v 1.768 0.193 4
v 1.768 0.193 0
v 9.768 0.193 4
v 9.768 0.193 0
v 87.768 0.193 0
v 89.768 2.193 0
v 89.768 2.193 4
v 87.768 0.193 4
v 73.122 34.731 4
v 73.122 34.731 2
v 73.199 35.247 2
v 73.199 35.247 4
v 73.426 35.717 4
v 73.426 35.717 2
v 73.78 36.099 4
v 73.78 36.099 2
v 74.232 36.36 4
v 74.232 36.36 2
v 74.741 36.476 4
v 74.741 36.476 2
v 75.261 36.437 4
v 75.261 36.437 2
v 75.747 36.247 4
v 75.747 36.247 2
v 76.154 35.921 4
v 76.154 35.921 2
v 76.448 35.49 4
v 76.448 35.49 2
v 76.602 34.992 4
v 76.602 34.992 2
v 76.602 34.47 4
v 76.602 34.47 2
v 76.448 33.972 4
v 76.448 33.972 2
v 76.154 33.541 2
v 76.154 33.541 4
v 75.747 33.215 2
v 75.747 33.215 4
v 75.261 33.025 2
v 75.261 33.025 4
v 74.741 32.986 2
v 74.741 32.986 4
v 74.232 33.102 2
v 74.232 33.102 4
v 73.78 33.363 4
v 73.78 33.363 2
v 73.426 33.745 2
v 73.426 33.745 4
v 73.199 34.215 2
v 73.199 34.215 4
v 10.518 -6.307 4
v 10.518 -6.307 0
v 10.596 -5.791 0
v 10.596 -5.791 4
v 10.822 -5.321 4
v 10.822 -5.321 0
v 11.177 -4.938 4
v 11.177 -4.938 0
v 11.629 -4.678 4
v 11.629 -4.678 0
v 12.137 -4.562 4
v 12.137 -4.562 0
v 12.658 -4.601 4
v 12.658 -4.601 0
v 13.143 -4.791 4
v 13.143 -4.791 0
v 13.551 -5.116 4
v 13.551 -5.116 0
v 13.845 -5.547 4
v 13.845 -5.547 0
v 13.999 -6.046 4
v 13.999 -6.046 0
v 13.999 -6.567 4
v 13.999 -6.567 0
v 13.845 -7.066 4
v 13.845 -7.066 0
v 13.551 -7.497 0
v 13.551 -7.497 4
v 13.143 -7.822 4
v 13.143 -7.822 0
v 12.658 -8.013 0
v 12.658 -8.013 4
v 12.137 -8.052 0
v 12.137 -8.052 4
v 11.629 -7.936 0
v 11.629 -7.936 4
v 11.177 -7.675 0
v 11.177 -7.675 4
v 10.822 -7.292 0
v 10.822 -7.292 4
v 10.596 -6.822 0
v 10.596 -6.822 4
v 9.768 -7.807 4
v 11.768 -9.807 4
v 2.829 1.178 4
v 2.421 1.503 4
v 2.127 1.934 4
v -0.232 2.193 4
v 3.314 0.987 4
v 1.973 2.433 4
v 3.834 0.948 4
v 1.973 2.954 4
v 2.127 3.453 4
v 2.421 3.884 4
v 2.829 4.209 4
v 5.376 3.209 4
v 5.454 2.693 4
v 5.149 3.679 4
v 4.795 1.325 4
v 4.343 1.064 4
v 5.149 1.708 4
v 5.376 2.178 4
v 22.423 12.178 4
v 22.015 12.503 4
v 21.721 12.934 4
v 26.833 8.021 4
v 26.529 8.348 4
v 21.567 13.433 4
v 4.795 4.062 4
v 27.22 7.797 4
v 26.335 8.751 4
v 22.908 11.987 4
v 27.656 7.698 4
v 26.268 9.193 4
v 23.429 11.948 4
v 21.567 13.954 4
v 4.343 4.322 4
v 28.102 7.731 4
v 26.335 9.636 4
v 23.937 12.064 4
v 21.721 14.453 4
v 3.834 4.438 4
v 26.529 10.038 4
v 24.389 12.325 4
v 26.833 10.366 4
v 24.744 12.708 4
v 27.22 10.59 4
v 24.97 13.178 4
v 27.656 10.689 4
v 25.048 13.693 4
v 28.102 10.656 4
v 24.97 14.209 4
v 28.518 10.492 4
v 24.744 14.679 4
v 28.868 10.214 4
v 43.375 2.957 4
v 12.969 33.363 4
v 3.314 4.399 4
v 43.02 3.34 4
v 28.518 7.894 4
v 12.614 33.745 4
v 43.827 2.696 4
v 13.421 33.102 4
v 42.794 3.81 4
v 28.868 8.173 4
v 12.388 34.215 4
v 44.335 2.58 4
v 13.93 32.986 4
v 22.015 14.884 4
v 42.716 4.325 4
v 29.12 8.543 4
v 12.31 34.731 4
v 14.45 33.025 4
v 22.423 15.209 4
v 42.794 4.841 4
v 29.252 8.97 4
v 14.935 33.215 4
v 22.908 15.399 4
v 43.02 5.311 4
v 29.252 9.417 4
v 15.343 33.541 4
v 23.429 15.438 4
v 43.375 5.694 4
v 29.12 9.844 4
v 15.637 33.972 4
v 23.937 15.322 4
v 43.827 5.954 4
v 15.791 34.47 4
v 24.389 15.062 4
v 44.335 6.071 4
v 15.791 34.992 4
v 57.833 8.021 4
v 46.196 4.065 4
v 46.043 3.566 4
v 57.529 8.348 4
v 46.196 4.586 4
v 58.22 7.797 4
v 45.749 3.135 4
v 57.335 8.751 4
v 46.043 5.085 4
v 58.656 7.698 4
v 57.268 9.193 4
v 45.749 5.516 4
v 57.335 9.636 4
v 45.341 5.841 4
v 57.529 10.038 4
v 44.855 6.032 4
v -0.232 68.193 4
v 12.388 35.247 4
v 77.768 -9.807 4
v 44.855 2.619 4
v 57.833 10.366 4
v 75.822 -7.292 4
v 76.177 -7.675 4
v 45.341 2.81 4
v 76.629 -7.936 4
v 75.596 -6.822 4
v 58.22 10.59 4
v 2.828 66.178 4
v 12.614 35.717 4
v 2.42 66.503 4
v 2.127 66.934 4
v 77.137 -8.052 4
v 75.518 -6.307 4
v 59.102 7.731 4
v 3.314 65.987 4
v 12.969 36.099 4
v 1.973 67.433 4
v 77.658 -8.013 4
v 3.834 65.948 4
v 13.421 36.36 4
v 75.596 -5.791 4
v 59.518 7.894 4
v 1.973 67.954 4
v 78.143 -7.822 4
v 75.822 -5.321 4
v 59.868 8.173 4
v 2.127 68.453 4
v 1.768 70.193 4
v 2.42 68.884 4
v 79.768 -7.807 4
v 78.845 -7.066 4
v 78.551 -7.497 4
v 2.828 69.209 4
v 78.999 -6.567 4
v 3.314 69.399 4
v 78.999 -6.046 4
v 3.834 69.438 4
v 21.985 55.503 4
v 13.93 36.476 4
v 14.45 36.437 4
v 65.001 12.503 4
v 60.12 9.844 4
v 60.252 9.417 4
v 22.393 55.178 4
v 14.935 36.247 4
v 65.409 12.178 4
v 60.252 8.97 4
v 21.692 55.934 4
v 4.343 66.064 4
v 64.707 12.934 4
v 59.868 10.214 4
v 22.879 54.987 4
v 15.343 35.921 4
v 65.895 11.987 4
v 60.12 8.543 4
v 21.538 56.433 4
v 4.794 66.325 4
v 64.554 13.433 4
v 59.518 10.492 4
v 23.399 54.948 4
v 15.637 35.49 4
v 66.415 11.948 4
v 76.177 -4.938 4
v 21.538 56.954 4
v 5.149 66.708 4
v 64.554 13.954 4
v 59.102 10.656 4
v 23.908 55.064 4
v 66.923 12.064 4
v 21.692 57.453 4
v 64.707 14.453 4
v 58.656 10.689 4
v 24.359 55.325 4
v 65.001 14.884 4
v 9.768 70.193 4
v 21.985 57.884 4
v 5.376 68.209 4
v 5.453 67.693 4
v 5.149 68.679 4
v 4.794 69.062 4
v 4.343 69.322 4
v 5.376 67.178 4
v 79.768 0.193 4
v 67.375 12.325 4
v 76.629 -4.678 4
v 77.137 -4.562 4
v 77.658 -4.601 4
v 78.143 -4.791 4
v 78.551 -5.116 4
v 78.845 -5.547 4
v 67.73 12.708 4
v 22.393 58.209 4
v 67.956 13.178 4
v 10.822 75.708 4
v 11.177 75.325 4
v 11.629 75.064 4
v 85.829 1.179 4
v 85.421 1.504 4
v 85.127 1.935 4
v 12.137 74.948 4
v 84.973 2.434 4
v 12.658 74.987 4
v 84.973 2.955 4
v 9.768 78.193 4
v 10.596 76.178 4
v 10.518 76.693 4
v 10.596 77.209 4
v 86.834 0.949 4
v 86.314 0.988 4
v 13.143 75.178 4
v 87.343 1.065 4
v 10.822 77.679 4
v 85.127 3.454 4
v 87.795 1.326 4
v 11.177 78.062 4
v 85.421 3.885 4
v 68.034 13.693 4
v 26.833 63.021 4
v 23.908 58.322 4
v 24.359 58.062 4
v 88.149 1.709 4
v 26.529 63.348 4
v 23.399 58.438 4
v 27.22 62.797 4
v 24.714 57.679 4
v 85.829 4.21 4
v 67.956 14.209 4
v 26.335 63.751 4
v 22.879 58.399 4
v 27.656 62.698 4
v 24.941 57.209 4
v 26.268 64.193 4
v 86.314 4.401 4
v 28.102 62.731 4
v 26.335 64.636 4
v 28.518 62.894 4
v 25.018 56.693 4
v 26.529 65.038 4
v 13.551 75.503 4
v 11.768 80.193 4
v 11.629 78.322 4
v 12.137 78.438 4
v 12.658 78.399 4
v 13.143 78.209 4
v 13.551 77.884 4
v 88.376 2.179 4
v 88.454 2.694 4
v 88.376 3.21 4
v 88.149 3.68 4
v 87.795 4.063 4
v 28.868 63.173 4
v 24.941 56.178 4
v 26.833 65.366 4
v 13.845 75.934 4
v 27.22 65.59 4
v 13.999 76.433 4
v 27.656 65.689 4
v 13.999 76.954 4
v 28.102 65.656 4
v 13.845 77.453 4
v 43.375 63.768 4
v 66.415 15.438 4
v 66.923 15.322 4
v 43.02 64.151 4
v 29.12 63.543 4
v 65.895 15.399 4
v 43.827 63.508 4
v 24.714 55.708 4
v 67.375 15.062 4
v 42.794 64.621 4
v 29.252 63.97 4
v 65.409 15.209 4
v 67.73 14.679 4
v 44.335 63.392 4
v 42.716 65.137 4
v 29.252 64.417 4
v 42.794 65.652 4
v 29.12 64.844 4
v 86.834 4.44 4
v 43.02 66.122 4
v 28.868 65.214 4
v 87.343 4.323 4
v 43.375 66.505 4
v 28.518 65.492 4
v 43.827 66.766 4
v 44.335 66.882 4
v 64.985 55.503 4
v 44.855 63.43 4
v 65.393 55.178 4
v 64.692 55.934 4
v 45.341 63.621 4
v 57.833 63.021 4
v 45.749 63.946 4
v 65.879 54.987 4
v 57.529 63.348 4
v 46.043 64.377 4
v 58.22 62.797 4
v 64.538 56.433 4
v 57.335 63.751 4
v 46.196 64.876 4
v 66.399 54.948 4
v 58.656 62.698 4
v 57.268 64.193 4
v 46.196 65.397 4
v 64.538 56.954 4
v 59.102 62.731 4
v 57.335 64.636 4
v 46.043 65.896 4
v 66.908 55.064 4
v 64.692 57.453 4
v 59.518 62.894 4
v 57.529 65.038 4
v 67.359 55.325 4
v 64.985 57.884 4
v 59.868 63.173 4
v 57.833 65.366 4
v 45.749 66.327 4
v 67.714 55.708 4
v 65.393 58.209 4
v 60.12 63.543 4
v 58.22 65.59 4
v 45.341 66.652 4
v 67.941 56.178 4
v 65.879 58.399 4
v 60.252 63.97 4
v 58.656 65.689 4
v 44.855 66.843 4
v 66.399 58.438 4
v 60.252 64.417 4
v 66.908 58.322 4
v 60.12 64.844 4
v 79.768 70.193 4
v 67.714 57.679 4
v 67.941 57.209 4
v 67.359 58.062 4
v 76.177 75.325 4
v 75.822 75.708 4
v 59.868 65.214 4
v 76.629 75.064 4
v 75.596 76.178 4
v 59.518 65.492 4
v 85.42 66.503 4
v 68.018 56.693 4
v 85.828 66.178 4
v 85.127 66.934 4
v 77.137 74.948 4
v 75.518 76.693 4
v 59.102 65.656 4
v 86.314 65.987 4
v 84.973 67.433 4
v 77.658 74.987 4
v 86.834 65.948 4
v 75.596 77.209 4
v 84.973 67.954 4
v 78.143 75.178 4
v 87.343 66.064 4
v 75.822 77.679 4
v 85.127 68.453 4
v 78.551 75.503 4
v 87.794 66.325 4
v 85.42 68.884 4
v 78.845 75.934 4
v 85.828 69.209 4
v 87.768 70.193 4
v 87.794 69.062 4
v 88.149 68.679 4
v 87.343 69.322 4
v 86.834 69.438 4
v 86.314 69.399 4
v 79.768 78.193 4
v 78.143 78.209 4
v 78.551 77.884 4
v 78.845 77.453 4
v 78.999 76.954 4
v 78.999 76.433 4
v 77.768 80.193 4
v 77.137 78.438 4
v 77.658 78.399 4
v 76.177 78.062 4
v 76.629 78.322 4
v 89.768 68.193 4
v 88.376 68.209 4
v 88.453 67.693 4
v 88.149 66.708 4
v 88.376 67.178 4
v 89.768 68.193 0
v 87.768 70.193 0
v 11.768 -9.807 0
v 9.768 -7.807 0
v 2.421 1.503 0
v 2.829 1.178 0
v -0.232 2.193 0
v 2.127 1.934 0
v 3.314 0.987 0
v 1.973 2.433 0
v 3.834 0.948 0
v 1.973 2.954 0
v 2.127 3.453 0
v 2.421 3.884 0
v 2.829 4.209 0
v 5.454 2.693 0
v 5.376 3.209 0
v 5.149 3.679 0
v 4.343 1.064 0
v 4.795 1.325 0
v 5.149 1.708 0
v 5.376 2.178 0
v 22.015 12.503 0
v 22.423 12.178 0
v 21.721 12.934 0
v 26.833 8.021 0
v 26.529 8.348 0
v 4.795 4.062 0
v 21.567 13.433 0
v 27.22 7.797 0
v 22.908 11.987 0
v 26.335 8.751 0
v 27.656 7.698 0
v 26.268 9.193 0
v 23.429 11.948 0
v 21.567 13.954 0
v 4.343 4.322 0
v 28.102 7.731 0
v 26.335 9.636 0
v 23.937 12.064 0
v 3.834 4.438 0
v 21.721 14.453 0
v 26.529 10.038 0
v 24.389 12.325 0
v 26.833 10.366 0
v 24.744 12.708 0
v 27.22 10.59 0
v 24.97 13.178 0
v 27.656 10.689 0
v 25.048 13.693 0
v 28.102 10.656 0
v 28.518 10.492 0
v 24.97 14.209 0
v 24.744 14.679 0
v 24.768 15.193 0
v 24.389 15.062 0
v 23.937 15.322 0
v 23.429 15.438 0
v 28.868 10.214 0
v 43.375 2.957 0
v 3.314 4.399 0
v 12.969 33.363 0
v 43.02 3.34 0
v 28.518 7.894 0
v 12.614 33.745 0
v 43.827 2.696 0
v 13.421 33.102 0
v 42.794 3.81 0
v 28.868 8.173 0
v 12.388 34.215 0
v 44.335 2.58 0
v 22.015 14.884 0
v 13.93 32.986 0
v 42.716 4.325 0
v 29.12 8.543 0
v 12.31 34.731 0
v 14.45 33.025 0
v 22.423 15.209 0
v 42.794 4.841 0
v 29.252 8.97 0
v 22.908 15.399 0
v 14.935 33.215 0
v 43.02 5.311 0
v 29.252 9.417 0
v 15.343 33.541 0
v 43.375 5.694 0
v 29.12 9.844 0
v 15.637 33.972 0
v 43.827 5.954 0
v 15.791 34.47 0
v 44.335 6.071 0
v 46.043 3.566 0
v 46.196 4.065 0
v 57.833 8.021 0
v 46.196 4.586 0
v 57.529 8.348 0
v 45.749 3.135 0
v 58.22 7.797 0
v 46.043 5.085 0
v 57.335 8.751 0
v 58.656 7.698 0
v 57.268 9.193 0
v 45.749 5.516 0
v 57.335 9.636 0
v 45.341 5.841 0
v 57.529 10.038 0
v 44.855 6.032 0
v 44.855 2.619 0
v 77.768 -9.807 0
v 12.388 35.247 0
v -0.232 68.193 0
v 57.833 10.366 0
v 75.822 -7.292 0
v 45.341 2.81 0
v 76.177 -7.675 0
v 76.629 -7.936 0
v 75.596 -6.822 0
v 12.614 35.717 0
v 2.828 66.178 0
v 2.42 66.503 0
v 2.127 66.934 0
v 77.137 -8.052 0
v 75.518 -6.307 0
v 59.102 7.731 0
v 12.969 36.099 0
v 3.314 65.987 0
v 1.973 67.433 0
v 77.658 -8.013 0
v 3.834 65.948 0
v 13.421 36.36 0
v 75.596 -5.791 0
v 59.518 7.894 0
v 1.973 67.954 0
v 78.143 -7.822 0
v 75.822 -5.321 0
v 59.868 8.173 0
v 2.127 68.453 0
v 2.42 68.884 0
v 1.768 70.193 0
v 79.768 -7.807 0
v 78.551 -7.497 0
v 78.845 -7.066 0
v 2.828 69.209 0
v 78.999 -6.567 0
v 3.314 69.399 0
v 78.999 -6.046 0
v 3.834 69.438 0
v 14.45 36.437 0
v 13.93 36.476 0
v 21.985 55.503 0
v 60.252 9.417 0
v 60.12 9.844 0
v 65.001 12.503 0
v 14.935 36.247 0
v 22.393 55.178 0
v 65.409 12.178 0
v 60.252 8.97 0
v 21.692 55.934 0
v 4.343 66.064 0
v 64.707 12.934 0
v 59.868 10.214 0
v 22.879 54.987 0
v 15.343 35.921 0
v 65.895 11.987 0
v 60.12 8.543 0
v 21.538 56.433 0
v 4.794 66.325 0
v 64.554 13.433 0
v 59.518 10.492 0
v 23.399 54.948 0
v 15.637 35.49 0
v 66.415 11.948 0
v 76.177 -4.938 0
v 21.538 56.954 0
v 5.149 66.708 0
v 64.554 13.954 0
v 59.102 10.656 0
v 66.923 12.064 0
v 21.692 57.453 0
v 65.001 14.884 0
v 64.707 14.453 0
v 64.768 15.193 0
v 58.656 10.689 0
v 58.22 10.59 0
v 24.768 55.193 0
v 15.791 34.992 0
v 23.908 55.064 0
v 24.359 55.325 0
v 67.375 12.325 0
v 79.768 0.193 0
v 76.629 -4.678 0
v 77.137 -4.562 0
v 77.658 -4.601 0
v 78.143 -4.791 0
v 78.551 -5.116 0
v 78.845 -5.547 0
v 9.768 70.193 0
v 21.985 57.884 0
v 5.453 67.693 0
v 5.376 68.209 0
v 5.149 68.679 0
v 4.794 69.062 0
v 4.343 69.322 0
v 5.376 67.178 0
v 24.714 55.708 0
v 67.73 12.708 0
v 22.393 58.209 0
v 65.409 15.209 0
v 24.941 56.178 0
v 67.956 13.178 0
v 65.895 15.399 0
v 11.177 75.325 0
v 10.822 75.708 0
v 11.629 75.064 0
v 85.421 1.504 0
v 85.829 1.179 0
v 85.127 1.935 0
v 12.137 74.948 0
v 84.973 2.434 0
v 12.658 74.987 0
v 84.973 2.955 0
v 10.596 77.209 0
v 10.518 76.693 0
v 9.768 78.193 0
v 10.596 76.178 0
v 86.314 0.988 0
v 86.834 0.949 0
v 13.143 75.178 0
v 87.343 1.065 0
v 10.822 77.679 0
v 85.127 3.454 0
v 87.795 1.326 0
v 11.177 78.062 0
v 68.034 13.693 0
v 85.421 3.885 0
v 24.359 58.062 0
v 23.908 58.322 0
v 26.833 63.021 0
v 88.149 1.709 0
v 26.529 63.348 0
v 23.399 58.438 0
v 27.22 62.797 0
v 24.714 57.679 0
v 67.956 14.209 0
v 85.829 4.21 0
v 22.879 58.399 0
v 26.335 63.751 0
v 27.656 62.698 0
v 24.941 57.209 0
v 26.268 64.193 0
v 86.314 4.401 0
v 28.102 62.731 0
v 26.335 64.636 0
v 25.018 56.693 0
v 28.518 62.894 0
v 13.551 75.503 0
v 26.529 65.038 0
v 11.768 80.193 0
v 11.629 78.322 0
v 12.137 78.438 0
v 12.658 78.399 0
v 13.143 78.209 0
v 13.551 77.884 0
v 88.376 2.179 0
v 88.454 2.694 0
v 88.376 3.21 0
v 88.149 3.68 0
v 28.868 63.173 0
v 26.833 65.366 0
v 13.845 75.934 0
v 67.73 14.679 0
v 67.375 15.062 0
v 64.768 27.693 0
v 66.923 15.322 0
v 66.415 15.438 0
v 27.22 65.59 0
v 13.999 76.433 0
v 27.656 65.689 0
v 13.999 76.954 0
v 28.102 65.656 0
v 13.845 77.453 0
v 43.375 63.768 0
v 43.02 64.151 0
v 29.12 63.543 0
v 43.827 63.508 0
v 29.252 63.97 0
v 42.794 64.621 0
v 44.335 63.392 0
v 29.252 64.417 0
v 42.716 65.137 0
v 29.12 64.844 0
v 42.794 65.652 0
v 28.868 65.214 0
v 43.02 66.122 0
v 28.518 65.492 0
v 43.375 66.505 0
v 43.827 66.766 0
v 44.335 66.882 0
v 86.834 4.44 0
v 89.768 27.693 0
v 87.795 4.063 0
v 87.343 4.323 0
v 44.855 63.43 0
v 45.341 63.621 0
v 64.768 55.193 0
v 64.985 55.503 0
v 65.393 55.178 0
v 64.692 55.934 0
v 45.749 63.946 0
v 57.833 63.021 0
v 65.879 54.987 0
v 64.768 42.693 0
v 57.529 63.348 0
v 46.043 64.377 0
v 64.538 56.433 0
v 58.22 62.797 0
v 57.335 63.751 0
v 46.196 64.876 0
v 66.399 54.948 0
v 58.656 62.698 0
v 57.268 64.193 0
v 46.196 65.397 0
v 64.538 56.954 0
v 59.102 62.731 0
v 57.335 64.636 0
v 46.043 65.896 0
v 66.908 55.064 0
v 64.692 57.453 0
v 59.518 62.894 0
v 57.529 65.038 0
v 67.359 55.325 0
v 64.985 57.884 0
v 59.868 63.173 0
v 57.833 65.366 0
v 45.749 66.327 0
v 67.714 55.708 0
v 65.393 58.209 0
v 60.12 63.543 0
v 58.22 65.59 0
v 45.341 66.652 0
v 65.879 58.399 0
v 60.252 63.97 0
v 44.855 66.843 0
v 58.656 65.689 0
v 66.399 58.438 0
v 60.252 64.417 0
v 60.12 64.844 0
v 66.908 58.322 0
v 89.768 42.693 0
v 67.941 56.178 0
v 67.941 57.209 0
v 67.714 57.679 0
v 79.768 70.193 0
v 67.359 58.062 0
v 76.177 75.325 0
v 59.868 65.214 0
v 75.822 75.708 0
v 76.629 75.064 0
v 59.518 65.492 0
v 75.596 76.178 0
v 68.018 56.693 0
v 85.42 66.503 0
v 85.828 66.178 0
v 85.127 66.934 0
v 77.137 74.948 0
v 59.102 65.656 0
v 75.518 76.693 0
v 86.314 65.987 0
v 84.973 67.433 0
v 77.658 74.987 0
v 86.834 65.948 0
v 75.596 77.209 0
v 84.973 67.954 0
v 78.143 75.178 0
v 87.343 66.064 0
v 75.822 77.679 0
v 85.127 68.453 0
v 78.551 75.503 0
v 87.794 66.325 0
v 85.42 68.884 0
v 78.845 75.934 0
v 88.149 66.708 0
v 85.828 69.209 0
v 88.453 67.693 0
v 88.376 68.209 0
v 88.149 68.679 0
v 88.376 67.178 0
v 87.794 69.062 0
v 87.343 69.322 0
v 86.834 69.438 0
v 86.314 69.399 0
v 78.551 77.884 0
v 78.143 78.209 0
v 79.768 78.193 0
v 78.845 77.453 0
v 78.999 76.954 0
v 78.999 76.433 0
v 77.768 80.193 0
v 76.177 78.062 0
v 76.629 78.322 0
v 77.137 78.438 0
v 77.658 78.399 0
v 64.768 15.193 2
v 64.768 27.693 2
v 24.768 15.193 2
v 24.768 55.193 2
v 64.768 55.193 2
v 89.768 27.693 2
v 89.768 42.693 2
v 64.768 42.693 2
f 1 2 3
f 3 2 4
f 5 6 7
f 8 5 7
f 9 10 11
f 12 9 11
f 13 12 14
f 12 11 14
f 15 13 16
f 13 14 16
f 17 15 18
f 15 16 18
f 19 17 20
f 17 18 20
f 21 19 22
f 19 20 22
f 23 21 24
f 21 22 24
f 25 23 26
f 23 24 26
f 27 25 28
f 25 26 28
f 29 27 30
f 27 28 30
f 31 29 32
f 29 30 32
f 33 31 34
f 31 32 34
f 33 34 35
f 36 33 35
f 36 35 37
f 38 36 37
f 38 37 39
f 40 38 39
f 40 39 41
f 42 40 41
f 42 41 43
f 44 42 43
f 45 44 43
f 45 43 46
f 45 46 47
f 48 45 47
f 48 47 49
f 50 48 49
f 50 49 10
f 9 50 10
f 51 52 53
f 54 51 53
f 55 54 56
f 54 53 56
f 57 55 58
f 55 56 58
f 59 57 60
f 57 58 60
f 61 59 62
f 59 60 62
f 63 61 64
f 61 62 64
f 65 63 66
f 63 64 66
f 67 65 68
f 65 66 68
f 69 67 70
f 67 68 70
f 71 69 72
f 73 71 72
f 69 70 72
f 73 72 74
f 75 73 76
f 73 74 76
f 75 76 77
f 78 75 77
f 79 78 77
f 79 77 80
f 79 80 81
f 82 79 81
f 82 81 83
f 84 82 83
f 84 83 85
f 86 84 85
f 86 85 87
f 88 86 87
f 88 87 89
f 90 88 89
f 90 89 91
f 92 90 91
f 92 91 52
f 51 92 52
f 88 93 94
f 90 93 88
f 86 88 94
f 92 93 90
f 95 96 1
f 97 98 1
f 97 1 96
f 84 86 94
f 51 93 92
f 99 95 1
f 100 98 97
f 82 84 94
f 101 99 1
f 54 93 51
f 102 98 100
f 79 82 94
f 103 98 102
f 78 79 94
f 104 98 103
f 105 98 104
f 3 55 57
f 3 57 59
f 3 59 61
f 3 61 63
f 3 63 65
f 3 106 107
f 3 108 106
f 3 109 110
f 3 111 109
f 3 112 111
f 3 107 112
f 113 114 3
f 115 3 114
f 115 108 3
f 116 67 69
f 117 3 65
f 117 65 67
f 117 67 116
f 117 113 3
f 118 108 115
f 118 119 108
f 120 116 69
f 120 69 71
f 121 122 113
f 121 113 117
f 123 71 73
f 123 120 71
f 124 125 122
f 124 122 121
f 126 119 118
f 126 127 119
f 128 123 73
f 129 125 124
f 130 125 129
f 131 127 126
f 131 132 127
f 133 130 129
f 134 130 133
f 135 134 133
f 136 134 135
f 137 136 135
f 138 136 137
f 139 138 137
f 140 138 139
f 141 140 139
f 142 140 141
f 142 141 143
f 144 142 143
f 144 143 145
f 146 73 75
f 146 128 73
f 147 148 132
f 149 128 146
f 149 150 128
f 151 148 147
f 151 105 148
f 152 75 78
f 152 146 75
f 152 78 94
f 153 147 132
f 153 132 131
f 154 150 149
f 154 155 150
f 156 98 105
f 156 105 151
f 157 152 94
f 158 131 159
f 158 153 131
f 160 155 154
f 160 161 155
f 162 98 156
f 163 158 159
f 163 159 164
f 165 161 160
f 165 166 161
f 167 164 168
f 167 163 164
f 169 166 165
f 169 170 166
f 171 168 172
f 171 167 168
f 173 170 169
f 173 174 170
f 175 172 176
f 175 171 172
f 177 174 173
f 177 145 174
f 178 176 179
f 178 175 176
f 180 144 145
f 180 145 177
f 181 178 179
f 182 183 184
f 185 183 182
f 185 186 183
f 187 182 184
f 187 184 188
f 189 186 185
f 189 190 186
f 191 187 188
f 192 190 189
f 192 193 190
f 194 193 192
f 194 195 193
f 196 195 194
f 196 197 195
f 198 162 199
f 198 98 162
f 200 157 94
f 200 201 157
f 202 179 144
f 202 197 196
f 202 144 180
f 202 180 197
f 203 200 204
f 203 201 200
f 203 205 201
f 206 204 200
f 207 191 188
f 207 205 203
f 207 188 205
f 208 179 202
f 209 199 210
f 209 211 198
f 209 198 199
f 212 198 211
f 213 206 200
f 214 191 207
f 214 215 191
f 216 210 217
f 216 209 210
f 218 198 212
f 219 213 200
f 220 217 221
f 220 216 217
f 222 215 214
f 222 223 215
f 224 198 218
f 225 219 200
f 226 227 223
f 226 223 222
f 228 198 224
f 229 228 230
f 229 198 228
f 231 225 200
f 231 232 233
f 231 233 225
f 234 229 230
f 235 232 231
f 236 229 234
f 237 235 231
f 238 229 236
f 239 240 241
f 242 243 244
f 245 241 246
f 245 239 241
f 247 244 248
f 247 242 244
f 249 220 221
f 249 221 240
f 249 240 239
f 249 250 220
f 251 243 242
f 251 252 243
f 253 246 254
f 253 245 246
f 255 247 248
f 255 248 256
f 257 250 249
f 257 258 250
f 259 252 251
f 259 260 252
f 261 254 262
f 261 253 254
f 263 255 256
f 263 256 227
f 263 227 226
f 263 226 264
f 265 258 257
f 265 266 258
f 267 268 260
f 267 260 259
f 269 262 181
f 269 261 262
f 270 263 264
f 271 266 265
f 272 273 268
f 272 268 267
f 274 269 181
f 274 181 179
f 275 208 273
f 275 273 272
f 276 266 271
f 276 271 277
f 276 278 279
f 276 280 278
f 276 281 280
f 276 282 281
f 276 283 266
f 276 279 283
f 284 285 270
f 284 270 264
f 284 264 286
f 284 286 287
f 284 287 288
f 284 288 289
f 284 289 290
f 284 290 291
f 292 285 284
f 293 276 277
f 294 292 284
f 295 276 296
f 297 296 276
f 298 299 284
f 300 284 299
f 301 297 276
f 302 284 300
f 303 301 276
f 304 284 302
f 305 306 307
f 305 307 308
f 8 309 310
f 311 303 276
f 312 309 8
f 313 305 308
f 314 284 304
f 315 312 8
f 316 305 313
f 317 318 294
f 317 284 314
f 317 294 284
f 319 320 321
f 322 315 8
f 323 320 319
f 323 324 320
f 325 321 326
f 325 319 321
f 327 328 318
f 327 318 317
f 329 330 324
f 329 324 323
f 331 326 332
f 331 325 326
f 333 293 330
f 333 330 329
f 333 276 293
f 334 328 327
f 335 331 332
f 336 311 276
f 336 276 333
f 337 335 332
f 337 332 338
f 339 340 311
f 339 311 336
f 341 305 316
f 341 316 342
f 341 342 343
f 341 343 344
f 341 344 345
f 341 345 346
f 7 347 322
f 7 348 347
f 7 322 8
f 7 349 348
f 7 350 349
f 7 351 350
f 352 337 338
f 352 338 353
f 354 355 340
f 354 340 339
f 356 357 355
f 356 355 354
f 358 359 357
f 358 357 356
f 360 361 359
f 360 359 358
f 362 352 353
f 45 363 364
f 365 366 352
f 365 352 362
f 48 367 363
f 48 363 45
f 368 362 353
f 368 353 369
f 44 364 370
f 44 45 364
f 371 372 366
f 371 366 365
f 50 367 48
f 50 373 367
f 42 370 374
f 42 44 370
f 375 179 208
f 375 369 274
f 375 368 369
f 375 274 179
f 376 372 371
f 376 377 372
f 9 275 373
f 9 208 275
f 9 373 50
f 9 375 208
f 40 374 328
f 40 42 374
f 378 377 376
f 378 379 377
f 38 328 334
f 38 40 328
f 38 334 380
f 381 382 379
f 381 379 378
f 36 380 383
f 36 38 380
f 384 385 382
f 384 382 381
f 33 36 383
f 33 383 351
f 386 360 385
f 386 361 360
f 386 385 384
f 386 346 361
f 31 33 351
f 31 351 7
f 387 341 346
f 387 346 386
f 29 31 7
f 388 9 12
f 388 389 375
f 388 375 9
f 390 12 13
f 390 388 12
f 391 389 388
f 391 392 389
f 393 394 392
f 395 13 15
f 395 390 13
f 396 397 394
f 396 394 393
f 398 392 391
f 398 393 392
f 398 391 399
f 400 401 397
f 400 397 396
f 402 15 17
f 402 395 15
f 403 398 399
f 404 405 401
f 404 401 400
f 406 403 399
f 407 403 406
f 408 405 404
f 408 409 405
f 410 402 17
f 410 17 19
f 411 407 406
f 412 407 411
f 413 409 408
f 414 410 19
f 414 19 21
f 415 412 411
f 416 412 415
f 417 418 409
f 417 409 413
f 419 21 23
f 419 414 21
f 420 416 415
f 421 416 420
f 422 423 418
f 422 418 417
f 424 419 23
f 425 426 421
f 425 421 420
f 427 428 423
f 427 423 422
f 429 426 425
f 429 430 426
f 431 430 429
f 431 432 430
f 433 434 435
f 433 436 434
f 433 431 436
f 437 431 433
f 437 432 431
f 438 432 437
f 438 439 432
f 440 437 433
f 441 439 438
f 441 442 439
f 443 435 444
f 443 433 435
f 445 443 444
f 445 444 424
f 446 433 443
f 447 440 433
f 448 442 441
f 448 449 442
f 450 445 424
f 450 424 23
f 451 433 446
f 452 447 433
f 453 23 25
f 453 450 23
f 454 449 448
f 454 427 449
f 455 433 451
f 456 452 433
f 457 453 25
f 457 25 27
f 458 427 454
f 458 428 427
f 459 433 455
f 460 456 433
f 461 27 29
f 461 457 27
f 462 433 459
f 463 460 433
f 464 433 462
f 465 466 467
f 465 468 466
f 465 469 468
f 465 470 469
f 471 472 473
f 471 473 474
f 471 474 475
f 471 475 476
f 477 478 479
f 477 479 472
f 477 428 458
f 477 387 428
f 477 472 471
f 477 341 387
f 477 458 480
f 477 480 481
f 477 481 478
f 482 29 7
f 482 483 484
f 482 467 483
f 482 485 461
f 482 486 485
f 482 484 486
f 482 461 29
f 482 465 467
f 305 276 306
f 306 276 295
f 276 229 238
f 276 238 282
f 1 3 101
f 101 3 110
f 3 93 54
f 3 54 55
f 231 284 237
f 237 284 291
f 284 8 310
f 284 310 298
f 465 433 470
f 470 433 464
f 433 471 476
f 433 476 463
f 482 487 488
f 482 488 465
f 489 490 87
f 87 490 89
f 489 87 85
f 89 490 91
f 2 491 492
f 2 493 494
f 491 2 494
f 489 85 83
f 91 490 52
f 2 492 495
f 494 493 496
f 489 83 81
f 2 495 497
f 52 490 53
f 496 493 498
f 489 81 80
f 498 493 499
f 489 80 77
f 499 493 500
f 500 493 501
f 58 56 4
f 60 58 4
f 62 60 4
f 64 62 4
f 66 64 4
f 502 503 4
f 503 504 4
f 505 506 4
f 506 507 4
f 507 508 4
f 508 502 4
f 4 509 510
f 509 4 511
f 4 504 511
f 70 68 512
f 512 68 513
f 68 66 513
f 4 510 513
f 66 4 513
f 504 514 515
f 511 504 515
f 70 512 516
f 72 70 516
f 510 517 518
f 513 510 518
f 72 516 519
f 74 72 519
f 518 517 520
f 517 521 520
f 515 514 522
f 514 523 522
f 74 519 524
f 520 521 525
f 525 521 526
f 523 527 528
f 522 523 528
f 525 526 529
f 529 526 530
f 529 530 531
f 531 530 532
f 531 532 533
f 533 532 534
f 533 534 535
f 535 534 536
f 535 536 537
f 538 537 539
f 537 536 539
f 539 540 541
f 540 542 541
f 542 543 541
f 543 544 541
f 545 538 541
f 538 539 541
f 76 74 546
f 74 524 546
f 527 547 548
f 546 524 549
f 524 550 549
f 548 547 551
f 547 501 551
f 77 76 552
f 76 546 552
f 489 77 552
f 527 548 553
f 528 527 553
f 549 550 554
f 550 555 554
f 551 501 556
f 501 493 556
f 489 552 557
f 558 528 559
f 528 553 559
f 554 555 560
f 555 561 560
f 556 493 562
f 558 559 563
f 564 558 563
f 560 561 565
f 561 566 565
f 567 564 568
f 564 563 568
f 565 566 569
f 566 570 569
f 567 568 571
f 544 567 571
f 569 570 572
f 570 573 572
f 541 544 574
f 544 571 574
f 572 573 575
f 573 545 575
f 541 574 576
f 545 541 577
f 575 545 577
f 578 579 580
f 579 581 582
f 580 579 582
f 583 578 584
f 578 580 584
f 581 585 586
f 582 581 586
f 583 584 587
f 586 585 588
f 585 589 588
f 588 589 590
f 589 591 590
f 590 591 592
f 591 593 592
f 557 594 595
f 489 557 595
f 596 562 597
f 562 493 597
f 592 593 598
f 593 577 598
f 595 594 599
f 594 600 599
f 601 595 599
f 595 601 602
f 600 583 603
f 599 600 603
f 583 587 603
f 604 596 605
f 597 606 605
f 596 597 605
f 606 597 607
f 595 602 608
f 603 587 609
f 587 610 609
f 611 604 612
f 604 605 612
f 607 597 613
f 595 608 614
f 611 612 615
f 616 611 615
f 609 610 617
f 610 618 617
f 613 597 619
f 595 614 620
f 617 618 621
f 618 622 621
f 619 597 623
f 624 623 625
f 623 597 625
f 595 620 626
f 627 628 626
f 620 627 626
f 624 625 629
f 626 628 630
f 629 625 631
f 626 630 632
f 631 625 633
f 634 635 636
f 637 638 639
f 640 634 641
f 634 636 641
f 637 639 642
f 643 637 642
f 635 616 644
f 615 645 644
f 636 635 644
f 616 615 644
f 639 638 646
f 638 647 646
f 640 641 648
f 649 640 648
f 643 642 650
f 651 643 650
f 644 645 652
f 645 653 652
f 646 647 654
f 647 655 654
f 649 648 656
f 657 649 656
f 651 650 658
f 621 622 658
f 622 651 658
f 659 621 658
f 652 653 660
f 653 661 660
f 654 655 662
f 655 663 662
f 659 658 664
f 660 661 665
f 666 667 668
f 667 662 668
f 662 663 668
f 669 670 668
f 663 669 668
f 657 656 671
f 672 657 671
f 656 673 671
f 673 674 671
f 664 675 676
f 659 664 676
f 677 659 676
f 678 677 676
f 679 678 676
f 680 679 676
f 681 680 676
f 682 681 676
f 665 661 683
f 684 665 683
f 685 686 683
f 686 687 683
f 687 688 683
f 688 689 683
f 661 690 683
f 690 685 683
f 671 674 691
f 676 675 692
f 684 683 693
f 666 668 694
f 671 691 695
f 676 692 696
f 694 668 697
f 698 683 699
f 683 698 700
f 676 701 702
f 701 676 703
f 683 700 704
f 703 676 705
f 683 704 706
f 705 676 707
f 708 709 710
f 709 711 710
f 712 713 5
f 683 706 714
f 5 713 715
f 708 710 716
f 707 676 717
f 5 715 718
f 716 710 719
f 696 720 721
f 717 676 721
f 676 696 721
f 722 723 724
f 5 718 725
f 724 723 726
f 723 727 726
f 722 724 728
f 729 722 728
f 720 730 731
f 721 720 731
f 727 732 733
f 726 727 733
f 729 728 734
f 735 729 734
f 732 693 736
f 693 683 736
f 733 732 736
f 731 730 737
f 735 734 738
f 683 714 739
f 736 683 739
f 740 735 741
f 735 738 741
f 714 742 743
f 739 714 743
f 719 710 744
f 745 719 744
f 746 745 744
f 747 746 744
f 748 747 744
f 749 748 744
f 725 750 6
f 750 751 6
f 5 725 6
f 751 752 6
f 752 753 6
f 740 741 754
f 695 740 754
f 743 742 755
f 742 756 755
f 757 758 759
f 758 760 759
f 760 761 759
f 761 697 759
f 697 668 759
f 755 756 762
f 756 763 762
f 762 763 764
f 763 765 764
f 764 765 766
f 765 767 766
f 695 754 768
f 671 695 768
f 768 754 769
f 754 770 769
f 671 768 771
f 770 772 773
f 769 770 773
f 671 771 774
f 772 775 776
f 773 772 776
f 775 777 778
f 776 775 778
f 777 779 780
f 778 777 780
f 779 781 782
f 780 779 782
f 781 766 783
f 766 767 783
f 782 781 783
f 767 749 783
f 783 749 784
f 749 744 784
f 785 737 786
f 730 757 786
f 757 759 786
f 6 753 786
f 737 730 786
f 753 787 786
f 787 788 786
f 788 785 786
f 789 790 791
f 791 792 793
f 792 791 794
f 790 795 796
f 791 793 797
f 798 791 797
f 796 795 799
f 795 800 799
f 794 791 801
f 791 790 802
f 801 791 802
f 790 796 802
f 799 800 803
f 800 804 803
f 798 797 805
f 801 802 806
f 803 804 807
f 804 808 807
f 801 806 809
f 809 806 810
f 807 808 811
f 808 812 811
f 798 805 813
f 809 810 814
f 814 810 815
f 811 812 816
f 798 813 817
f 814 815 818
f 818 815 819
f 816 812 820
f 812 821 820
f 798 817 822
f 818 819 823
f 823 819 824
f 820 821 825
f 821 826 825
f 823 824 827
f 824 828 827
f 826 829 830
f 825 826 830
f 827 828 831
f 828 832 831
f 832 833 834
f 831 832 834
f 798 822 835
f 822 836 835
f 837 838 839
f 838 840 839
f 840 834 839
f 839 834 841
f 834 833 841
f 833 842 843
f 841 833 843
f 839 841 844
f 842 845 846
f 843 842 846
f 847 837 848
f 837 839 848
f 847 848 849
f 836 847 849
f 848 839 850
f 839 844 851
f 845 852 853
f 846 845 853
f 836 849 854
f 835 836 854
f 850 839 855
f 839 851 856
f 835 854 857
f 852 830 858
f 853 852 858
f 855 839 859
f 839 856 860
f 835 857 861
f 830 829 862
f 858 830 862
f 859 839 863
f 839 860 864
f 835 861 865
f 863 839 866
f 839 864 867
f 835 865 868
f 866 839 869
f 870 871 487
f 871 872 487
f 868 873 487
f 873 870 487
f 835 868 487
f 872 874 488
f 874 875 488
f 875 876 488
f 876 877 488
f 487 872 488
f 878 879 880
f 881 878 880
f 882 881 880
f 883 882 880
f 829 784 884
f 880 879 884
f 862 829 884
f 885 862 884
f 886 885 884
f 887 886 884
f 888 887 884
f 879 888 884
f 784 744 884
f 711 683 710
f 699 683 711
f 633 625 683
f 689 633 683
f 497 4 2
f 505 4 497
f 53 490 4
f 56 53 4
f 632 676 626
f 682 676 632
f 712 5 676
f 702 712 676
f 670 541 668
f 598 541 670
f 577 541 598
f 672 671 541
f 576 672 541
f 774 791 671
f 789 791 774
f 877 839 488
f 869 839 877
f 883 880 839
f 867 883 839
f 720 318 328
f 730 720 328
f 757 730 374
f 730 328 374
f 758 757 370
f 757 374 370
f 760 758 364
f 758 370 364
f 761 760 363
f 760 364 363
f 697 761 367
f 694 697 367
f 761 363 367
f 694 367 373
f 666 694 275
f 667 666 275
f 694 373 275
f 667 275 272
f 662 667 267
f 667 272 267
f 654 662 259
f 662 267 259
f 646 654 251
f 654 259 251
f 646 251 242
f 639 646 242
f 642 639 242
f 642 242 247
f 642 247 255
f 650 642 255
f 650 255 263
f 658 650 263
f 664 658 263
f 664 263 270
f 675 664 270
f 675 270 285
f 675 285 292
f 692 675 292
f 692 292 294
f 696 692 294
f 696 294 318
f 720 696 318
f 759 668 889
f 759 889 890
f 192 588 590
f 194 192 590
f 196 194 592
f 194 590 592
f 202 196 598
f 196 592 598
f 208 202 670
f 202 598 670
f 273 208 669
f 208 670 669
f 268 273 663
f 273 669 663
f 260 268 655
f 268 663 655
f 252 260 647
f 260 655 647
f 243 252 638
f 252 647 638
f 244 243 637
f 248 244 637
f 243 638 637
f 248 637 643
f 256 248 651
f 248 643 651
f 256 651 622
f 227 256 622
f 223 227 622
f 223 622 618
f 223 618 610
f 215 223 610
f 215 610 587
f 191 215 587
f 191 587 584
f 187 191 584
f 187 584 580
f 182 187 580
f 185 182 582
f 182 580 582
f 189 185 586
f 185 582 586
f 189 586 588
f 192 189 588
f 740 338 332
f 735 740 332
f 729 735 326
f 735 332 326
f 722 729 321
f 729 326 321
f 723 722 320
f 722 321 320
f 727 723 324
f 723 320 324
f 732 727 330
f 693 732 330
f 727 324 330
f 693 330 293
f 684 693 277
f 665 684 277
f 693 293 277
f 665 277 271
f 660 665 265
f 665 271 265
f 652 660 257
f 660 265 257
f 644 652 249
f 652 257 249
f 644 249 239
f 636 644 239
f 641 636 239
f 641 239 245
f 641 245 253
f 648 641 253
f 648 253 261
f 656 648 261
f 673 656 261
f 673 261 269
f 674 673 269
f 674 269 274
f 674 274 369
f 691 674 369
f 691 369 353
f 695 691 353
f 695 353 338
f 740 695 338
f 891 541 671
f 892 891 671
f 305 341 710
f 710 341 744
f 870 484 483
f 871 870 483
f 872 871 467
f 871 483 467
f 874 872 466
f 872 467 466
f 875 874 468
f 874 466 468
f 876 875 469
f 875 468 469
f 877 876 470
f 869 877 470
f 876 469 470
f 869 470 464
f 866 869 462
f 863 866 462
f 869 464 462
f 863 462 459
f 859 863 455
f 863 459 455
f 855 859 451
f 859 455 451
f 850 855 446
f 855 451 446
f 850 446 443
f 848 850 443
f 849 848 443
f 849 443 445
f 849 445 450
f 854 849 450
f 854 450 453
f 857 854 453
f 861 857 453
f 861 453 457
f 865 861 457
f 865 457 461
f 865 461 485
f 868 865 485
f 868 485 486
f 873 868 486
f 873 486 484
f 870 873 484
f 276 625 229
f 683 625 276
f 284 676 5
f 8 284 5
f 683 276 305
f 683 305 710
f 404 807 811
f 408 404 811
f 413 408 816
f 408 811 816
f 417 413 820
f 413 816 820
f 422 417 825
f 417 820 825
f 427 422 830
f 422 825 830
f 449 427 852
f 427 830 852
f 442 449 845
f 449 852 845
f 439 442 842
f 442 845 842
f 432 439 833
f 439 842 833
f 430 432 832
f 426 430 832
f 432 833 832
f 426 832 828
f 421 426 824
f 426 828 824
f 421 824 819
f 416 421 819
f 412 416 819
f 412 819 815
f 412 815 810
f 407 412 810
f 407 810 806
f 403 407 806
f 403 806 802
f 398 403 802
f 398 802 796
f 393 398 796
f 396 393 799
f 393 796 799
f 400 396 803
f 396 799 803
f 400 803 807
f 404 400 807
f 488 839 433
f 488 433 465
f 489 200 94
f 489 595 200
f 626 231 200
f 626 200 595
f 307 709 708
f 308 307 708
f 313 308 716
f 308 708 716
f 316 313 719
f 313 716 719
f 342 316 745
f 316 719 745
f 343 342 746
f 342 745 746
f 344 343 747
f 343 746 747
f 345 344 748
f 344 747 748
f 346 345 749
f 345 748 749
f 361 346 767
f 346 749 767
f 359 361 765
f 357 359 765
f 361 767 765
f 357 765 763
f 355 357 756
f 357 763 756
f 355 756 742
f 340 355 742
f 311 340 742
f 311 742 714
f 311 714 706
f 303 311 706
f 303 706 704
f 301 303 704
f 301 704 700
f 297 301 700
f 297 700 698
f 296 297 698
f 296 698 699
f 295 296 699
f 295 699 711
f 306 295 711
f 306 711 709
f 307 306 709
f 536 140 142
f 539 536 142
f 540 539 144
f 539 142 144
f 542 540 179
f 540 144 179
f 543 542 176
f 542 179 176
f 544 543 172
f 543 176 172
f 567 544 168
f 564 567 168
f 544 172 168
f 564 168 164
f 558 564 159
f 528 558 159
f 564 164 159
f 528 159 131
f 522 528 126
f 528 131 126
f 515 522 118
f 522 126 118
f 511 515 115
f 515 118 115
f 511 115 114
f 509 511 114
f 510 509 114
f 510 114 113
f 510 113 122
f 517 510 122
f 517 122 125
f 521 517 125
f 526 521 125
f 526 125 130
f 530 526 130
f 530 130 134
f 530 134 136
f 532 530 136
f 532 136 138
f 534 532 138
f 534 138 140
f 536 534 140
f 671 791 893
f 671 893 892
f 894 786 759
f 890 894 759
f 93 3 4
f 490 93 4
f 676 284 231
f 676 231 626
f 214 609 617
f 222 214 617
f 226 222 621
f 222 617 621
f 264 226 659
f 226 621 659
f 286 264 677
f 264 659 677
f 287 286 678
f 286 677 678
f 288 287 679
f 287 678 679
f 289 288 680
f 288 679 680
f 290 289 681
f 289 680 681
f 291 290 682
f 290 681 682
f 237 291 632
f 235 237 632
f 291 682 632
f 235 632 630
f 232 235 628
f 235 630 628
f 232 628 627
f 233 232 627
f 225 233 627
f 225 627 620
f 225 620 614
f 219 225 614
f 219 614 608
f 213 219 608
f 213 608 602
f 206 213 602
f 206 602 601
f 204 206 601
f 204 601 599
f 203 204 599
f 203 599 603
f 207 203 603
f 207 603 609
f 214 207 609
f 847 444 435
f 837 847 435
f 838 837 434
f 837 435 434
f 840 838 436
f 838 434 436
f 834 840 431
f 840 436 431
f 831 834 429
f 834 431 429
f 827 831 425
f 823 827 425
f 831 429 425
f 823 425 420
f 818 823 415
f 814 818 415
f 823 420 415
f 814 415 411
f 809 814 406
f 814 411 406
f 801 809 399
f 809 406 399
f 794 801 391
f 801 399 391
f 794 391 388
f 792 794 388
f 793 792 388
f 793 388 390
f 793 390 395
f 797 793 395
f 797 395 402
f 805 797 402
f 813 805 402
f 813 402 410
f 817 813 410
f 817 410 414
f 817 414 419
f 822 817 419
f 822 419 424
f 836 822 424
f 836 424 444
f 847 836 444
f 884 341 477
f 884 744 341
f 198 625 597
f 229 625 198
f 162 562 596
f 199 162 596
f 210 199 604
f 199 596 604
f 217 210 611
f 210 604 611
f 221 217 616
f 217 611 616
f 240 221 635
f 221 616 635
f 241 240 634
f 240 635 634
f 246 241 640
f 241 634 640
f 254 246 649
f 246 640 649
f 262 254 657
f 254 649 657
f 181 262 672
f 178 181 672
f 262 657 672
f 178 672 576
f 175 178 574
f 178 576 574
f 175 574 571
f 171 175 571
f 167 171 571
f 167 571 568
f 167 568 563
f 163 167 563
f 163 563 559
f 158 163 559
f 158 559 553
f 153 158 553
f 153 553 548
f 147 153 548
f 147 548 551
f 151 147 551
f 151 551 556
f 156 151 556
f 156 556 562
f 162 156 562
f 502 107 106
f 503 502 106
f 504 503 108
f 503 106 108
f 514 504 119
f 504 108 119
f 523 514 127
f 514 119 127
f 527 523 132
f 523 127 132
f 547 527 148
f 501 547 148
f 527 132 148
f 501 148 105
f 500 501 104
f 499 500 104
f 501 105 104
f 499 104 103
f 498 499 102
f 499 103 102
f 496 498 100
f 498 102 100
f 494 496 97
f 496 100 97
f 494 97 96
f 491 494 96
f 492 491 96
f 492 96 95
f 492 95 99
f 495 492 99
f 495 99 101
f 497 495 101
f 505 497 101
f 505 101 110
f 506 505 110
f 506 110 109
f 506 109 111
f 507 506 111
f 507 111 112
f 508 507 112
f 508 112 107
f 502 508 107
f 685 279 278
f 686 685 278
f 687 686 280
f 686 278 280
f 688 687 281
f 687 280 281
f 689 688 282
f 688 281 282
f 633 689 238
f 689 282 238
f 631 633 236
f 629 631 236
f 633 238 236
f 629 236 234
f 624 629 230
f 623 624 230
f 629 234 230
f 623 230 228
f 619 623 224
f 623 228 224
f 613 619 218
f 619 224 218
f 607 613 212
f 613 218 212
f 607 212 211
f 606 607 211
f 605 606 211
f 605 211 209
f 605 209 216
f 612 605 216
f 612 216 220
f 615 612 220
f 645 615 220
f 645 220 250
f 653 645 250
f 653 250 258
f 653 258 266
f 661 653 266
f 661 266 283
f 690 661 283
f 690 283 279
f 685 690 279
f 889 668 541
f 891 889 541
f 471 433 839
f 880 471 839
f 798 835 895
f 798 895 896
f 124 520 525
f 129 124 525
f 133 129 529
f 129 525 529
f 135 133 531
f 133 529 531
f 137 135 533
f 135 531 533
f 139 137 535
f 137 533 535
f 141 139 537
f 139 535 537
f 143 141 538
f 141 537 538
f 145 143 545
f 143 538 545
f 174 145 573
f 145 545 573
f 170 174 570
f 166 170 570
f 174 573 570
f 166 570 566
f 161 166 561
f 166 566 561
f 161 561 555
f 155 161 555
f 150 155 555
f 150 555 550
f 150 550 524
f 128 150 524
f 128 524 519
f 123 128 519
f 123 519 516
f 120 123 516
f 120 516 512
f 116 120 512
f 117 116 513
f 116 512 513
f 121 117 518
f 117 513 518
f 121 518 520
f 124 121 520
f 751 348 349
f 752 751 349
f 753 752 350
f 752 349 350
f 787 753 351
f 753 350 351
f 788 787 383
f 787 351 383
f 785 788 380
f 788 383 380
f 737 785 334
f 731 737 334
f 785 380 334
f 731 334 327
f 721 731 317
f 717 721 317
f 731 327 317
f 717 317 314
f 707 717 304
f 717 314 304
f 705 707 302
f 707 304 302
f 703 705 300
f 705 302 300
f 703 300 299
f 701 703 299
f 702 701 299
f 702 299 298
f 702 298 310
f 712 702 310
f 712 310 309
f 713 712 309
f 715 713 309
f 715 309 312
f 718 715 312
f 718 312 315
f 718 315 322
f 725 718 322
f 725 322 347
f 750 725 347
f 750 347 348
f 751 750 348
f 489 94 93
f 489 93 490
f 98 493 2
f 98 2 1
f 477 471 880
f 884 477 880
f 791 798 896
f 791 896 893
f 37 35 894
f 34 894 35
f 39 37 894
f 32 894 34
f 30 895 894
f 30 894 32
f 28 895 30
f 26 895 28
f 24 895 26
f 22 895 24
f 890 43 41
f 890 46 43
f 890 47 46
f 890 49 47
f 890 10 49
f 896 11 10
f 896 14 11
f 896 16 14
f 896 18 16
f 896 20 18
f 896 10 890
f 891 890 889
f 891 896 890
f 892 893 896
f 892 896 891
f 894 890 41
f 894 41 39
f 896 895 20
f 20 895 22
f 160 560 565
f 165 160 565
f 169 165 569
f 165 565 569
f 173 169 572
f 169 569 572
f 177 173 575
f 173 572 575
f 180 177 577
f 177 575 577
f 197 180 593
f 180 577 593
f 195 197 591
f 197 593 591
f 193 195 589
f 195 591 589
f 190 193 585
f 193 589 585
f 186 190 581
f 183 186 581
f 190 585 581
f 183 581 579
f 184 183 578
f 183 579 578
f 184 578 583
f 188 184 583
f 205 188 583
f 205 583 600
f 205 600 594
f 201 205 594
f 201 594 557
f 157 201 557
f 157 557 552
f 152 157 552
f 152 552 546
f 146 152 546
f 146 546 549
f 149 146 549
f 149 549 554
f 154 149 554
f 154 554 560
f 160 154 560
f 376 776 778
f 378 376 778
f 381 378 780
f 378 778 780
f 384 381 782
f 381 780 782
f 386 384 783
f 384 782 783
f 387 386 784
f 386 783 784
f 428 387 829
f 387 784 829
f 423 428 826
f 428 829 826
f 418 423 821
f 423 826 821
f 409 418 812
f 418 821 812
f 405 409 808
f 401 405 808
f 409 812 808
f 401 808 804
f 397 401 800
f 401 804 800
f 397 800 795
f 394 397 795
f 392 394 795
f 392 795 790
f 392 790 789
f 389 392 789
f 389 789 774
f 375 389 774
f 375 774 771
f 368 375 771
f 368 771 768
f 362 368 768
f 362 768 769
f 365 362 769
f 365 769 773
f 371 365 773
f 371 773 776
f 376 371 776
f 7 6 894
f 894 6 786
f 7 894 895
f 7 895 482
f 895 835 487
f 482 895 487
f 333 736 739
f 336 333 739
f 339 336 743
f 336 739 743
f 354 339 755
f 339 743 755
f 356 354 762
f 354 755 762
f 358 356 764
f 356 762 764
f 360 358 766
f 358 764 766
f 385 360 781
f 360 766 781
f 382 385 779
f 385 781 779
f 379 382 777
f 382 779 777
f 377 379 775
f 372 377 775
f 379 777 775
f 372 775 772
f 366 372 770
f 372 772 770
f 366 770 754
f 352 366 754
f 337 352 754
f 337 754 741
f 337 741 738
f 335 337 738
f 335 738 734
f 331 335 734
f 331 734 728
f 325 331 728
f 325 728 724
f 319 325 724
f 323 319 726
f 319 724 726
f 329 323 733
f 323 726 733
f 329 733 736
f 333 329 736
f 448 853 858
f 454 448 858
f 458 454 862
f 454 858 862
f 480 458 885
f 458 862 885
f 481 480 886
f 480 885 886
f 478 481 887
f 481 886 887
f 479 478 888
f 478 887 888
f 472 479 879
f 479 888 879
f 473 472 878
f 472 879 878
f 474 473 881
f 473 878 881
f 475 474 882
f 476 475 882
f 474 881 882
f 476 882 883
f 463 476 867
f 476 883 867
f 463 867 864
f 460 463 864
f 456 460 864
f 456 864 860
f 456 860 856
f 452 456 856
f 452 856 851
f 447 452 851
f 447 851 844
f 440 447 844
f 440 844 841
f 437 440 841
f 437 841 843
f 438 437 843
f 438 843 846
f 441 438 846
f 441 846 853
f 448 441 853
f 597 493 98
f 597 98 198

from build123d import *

# Parameters (mm, degrees)
SKETCH1_W           = 90
SKETCH1_H           = 70
BOSS_EXTRUDE1_DEPTH = 4
SKETCH2_R           = 1.75
CUT_EXTRUDE1_DEPTH  = 5
CHAMFER1_SIZE       = 2
CHAMFER2_SIZE       = 2
CHAMFER3_SIZE       = 2
CHAMFER4_SIZE       = 2
SKETCH5_W           = 70
SKETCH5_H           = 4
BOSS_EXTRUDE3_DEPTH = 10
SKETCH4_W           = 70
SKETCH4_H           = 4
BOSS_EXTRUDE4_DEPTH = 10
SKETCH6_R           = 1.75
CUT_EXTRUDE2_DEPTH  = 10
CHAMFER5_SIZE       = 2
SKETCH7_W           = 40
SKETCH7_H           = 40
CUT_EXTRUDE3_DEPTH  = 2
SKETCH8_W           = 25
SKETCH8_H           = 15
CUT_EXTRUDE4_DEPTH  = 2
SKETCH9_R           = 1.5
CUT_EXTRUDE5_DEPTH  = 4
SKETCH10_R          = 1.75
CUT_EXTRUDE6_DEPTH  = 10


with BuildPart() as part:
    # Sketch1 → Boss-Extrude1 (new body)
    with BuildSketch(Plane.XY):
        with Locations((44.768273235, 35.193370166)):
            Rectangle(SKETCH1_W, SKETCH1_H)
    extrude(amount=BOSS_EXTRUDE1_DEPTH)

    # Sketch2 → Cut-Extrude1 (cut)
    with BuildSketch(Plane.XY.offset(4)):
        with Locations((3.703568783, 2.693370166)):
            Circle(SKETCH2_R)
        with Locations((86.703568783, 2.694436567)):
            Circle(SKETCH2_R)
        with Locations((86.703273235, 67.693370166)):
            Circle(SKETCH2_R)
        with Locations((3.703273235, 67.693370166)):
            Circle(SKETCH2_R)
        with Locations((23.297725672, 13.693370166)):
            Circle(SKETCH2_R)
        with Locations((66.284051901, 13.693370166)):
            Circle(SKETCH2_R)
        with Locations((66.268273235, 56.693370166)):
            Circle(SKETCH2_R)
        with Locations((23.268273235, 56.693370166)):
            Circle(SKETCH2_R)
    extrude(amount=-CUT_EXTRUDE1_DEPTH, mode=Mode.SUBTRACT)

    # Chamfer1
    chamfer1_edges = [part.edges().sort_by_distance(p)[0] for p in [
        (89.768273235, 0.193370166, 2),
    ]]
    chamfer(chamfer1_edges, length=CHAMFER1_SIZE)

    # Chamfer2
    chamfer2_edges = [part.edges().sort_by_distance(p)[0] for p in [
        (-0.231726765, 0.193370166, 2),
    ]]
    chamfer(chamfer2_edges, length=CHAMFER2_SIZE)

    # Chamfer3
    chamfer3_edges = [part.edges().sort_by_distance(p)[0] for p in [
        (-0.231726765, 70.193370166, 2),
    ]]
    chamfer(chamfer3_edges, length=CHAMFER3_SIZE)

    # Chamfer4
    chamfer4_edges = [part.edges().sort_by_distance(p)[0] for p in [
        (89.768273235, 70.193370166, 2),
    ]]
    chamfer(chamfer4_edges, length=CHAMFER4_SIZE)

    # Sketch5 → Boss-Extrude3 (add)
    with BuildSketch(Plane(origin=(0, 70.193370166, 0), x_dir=(1, 0, 0), z_dir=(0, 1, 0))):
        with Locations((44.768273235, -2)):
            Rectangle(SKETCH5_W, SKETCH5_H)
    extrude(amount=BOSS_EXTRUDE3_DEPTH)

    # Sketch4 → Boss-Extrude4 (add)
    with BuildSketch(Plane(origin=(0, 0.193370166, 0), x_dir=(-1, 0, 0), z_dir=(0, -1, 0))):
        with Locations((-44.768273235, -2)):
            Rectangle(SKETCH4_W, SKETCH4_H)
    extrude(amount=BOSS_EXTRUDE4_DEPTH)

    # Sketch6 → Cut-Extrude2 (cut)
    with BuildSketch(Plane(origin=(0, 0, 0), x_dir=(-1, 0, 0), z_dir=(0, 0, -1))):
        with Locations((-12.268273235, 76.693370166)):
            Circle(SKETCH6_R)
        with Locations((-77.268273235, 76.693370166)):
            Circle(SKETCH6_R)
        with Locations((-77.268273235, -6.306629834)):
            Circle(SKETCH6_R)
        with Locations((-12.268273235, -6.306629834)):
            Circle(SKETCH6_R)
    extrude(amount=-CUT_EXTRUDE2_DEPTH, mode=Mode.SUBTRACT)

    # Chamfer5
    chamfer5_edges = [part.edges().sort_by_distance(p)[0] for p in [
        (9.768273235, 80.193370166, 2),
        (79.768273235, 80.193370166, 2),
        (9.768273235, -9.806629834, 2),
        (79.768273235, -9.806629834, 2),
    ]]
    chamfer(chamfer5_edges, length=CHAMFER5_SIZE)

    # Sketch7 → Cut-Extrude3 (cut)
    with BuildSketch(Plane(origin=(0, 0, 0), x_dir=(-1, 0, 0), z_dir=(0, 0, -1))):
        with Locations((-44.768273235, 35.193370166)):
            Rectangle(SKETCH7_W, SKETCH7_H)
    extrude(amount=-CUT_EXTRUDE3_DEPTH, mode=Mode.SUBTRACT)

    # Sketch8 → Cut-Extrude4 (cut)
    with BuildSketch(Plane(origin=(0, 0, 0), x_dir=(-1, 0, 0), z_dir=(0, 0, -1))):
        with Locations((-77.268273235, 35.193370166)):
            Rectangle(SKETCH8_W, SKETCH8_H)
    extrude(amount=-CUT_EXTRUDE4_DEPTH, mode=Mode.SUBTRACT)

    # Sketch9 → Cut-Extrude5 (cut)
    with BuildSketch(Plane(origin=(0, 0, 0), x_dir=(-1, 0, 0), z_dir=(0, 0, -1))):
        with Locations((-27.768273235, 9.193370166)):
            Circle(SKETCH9_R)
        with Locations((-58.768273235, 9.193370166)):
            Circle(SKETCH9_R)
        with Locations((-27.768273235, 64.193370166)):
            Circle(SKETCH9_R)
        with Locations((-58.768273235, 64.193370166)):
            Circle(SKETCH9_R)
    extrude(amount=-CUT_EXTRUDE5_DEPTH, mode=Mode.SUBTRACT)

    # Sketch10 → Cut-Extrude6 (cut)
    with BuildSketch(Plane(origin=(0, 0, 0), x_dir=(-1, 0, 0), z_dir=(0, 0, -1))):
        with Locations((-74.871589862, 34.731015085)):
            Circle(SKETCH10_R)
        with Locations((-44.465998271, 4.325423494)):
            Circle(SKETCH10_R)
        with Locations((-14.06040668, 34.731015085)):
            Circle(SKETCH10_R)
        with Locations((-44.465998271, 65.136606676)):
            Circle(SKETCH10_R)
    extrude(amount=-CUT_EXTRUDE6_DEPTH, mode=Mode.SUBTRACT)


solid = part.part
